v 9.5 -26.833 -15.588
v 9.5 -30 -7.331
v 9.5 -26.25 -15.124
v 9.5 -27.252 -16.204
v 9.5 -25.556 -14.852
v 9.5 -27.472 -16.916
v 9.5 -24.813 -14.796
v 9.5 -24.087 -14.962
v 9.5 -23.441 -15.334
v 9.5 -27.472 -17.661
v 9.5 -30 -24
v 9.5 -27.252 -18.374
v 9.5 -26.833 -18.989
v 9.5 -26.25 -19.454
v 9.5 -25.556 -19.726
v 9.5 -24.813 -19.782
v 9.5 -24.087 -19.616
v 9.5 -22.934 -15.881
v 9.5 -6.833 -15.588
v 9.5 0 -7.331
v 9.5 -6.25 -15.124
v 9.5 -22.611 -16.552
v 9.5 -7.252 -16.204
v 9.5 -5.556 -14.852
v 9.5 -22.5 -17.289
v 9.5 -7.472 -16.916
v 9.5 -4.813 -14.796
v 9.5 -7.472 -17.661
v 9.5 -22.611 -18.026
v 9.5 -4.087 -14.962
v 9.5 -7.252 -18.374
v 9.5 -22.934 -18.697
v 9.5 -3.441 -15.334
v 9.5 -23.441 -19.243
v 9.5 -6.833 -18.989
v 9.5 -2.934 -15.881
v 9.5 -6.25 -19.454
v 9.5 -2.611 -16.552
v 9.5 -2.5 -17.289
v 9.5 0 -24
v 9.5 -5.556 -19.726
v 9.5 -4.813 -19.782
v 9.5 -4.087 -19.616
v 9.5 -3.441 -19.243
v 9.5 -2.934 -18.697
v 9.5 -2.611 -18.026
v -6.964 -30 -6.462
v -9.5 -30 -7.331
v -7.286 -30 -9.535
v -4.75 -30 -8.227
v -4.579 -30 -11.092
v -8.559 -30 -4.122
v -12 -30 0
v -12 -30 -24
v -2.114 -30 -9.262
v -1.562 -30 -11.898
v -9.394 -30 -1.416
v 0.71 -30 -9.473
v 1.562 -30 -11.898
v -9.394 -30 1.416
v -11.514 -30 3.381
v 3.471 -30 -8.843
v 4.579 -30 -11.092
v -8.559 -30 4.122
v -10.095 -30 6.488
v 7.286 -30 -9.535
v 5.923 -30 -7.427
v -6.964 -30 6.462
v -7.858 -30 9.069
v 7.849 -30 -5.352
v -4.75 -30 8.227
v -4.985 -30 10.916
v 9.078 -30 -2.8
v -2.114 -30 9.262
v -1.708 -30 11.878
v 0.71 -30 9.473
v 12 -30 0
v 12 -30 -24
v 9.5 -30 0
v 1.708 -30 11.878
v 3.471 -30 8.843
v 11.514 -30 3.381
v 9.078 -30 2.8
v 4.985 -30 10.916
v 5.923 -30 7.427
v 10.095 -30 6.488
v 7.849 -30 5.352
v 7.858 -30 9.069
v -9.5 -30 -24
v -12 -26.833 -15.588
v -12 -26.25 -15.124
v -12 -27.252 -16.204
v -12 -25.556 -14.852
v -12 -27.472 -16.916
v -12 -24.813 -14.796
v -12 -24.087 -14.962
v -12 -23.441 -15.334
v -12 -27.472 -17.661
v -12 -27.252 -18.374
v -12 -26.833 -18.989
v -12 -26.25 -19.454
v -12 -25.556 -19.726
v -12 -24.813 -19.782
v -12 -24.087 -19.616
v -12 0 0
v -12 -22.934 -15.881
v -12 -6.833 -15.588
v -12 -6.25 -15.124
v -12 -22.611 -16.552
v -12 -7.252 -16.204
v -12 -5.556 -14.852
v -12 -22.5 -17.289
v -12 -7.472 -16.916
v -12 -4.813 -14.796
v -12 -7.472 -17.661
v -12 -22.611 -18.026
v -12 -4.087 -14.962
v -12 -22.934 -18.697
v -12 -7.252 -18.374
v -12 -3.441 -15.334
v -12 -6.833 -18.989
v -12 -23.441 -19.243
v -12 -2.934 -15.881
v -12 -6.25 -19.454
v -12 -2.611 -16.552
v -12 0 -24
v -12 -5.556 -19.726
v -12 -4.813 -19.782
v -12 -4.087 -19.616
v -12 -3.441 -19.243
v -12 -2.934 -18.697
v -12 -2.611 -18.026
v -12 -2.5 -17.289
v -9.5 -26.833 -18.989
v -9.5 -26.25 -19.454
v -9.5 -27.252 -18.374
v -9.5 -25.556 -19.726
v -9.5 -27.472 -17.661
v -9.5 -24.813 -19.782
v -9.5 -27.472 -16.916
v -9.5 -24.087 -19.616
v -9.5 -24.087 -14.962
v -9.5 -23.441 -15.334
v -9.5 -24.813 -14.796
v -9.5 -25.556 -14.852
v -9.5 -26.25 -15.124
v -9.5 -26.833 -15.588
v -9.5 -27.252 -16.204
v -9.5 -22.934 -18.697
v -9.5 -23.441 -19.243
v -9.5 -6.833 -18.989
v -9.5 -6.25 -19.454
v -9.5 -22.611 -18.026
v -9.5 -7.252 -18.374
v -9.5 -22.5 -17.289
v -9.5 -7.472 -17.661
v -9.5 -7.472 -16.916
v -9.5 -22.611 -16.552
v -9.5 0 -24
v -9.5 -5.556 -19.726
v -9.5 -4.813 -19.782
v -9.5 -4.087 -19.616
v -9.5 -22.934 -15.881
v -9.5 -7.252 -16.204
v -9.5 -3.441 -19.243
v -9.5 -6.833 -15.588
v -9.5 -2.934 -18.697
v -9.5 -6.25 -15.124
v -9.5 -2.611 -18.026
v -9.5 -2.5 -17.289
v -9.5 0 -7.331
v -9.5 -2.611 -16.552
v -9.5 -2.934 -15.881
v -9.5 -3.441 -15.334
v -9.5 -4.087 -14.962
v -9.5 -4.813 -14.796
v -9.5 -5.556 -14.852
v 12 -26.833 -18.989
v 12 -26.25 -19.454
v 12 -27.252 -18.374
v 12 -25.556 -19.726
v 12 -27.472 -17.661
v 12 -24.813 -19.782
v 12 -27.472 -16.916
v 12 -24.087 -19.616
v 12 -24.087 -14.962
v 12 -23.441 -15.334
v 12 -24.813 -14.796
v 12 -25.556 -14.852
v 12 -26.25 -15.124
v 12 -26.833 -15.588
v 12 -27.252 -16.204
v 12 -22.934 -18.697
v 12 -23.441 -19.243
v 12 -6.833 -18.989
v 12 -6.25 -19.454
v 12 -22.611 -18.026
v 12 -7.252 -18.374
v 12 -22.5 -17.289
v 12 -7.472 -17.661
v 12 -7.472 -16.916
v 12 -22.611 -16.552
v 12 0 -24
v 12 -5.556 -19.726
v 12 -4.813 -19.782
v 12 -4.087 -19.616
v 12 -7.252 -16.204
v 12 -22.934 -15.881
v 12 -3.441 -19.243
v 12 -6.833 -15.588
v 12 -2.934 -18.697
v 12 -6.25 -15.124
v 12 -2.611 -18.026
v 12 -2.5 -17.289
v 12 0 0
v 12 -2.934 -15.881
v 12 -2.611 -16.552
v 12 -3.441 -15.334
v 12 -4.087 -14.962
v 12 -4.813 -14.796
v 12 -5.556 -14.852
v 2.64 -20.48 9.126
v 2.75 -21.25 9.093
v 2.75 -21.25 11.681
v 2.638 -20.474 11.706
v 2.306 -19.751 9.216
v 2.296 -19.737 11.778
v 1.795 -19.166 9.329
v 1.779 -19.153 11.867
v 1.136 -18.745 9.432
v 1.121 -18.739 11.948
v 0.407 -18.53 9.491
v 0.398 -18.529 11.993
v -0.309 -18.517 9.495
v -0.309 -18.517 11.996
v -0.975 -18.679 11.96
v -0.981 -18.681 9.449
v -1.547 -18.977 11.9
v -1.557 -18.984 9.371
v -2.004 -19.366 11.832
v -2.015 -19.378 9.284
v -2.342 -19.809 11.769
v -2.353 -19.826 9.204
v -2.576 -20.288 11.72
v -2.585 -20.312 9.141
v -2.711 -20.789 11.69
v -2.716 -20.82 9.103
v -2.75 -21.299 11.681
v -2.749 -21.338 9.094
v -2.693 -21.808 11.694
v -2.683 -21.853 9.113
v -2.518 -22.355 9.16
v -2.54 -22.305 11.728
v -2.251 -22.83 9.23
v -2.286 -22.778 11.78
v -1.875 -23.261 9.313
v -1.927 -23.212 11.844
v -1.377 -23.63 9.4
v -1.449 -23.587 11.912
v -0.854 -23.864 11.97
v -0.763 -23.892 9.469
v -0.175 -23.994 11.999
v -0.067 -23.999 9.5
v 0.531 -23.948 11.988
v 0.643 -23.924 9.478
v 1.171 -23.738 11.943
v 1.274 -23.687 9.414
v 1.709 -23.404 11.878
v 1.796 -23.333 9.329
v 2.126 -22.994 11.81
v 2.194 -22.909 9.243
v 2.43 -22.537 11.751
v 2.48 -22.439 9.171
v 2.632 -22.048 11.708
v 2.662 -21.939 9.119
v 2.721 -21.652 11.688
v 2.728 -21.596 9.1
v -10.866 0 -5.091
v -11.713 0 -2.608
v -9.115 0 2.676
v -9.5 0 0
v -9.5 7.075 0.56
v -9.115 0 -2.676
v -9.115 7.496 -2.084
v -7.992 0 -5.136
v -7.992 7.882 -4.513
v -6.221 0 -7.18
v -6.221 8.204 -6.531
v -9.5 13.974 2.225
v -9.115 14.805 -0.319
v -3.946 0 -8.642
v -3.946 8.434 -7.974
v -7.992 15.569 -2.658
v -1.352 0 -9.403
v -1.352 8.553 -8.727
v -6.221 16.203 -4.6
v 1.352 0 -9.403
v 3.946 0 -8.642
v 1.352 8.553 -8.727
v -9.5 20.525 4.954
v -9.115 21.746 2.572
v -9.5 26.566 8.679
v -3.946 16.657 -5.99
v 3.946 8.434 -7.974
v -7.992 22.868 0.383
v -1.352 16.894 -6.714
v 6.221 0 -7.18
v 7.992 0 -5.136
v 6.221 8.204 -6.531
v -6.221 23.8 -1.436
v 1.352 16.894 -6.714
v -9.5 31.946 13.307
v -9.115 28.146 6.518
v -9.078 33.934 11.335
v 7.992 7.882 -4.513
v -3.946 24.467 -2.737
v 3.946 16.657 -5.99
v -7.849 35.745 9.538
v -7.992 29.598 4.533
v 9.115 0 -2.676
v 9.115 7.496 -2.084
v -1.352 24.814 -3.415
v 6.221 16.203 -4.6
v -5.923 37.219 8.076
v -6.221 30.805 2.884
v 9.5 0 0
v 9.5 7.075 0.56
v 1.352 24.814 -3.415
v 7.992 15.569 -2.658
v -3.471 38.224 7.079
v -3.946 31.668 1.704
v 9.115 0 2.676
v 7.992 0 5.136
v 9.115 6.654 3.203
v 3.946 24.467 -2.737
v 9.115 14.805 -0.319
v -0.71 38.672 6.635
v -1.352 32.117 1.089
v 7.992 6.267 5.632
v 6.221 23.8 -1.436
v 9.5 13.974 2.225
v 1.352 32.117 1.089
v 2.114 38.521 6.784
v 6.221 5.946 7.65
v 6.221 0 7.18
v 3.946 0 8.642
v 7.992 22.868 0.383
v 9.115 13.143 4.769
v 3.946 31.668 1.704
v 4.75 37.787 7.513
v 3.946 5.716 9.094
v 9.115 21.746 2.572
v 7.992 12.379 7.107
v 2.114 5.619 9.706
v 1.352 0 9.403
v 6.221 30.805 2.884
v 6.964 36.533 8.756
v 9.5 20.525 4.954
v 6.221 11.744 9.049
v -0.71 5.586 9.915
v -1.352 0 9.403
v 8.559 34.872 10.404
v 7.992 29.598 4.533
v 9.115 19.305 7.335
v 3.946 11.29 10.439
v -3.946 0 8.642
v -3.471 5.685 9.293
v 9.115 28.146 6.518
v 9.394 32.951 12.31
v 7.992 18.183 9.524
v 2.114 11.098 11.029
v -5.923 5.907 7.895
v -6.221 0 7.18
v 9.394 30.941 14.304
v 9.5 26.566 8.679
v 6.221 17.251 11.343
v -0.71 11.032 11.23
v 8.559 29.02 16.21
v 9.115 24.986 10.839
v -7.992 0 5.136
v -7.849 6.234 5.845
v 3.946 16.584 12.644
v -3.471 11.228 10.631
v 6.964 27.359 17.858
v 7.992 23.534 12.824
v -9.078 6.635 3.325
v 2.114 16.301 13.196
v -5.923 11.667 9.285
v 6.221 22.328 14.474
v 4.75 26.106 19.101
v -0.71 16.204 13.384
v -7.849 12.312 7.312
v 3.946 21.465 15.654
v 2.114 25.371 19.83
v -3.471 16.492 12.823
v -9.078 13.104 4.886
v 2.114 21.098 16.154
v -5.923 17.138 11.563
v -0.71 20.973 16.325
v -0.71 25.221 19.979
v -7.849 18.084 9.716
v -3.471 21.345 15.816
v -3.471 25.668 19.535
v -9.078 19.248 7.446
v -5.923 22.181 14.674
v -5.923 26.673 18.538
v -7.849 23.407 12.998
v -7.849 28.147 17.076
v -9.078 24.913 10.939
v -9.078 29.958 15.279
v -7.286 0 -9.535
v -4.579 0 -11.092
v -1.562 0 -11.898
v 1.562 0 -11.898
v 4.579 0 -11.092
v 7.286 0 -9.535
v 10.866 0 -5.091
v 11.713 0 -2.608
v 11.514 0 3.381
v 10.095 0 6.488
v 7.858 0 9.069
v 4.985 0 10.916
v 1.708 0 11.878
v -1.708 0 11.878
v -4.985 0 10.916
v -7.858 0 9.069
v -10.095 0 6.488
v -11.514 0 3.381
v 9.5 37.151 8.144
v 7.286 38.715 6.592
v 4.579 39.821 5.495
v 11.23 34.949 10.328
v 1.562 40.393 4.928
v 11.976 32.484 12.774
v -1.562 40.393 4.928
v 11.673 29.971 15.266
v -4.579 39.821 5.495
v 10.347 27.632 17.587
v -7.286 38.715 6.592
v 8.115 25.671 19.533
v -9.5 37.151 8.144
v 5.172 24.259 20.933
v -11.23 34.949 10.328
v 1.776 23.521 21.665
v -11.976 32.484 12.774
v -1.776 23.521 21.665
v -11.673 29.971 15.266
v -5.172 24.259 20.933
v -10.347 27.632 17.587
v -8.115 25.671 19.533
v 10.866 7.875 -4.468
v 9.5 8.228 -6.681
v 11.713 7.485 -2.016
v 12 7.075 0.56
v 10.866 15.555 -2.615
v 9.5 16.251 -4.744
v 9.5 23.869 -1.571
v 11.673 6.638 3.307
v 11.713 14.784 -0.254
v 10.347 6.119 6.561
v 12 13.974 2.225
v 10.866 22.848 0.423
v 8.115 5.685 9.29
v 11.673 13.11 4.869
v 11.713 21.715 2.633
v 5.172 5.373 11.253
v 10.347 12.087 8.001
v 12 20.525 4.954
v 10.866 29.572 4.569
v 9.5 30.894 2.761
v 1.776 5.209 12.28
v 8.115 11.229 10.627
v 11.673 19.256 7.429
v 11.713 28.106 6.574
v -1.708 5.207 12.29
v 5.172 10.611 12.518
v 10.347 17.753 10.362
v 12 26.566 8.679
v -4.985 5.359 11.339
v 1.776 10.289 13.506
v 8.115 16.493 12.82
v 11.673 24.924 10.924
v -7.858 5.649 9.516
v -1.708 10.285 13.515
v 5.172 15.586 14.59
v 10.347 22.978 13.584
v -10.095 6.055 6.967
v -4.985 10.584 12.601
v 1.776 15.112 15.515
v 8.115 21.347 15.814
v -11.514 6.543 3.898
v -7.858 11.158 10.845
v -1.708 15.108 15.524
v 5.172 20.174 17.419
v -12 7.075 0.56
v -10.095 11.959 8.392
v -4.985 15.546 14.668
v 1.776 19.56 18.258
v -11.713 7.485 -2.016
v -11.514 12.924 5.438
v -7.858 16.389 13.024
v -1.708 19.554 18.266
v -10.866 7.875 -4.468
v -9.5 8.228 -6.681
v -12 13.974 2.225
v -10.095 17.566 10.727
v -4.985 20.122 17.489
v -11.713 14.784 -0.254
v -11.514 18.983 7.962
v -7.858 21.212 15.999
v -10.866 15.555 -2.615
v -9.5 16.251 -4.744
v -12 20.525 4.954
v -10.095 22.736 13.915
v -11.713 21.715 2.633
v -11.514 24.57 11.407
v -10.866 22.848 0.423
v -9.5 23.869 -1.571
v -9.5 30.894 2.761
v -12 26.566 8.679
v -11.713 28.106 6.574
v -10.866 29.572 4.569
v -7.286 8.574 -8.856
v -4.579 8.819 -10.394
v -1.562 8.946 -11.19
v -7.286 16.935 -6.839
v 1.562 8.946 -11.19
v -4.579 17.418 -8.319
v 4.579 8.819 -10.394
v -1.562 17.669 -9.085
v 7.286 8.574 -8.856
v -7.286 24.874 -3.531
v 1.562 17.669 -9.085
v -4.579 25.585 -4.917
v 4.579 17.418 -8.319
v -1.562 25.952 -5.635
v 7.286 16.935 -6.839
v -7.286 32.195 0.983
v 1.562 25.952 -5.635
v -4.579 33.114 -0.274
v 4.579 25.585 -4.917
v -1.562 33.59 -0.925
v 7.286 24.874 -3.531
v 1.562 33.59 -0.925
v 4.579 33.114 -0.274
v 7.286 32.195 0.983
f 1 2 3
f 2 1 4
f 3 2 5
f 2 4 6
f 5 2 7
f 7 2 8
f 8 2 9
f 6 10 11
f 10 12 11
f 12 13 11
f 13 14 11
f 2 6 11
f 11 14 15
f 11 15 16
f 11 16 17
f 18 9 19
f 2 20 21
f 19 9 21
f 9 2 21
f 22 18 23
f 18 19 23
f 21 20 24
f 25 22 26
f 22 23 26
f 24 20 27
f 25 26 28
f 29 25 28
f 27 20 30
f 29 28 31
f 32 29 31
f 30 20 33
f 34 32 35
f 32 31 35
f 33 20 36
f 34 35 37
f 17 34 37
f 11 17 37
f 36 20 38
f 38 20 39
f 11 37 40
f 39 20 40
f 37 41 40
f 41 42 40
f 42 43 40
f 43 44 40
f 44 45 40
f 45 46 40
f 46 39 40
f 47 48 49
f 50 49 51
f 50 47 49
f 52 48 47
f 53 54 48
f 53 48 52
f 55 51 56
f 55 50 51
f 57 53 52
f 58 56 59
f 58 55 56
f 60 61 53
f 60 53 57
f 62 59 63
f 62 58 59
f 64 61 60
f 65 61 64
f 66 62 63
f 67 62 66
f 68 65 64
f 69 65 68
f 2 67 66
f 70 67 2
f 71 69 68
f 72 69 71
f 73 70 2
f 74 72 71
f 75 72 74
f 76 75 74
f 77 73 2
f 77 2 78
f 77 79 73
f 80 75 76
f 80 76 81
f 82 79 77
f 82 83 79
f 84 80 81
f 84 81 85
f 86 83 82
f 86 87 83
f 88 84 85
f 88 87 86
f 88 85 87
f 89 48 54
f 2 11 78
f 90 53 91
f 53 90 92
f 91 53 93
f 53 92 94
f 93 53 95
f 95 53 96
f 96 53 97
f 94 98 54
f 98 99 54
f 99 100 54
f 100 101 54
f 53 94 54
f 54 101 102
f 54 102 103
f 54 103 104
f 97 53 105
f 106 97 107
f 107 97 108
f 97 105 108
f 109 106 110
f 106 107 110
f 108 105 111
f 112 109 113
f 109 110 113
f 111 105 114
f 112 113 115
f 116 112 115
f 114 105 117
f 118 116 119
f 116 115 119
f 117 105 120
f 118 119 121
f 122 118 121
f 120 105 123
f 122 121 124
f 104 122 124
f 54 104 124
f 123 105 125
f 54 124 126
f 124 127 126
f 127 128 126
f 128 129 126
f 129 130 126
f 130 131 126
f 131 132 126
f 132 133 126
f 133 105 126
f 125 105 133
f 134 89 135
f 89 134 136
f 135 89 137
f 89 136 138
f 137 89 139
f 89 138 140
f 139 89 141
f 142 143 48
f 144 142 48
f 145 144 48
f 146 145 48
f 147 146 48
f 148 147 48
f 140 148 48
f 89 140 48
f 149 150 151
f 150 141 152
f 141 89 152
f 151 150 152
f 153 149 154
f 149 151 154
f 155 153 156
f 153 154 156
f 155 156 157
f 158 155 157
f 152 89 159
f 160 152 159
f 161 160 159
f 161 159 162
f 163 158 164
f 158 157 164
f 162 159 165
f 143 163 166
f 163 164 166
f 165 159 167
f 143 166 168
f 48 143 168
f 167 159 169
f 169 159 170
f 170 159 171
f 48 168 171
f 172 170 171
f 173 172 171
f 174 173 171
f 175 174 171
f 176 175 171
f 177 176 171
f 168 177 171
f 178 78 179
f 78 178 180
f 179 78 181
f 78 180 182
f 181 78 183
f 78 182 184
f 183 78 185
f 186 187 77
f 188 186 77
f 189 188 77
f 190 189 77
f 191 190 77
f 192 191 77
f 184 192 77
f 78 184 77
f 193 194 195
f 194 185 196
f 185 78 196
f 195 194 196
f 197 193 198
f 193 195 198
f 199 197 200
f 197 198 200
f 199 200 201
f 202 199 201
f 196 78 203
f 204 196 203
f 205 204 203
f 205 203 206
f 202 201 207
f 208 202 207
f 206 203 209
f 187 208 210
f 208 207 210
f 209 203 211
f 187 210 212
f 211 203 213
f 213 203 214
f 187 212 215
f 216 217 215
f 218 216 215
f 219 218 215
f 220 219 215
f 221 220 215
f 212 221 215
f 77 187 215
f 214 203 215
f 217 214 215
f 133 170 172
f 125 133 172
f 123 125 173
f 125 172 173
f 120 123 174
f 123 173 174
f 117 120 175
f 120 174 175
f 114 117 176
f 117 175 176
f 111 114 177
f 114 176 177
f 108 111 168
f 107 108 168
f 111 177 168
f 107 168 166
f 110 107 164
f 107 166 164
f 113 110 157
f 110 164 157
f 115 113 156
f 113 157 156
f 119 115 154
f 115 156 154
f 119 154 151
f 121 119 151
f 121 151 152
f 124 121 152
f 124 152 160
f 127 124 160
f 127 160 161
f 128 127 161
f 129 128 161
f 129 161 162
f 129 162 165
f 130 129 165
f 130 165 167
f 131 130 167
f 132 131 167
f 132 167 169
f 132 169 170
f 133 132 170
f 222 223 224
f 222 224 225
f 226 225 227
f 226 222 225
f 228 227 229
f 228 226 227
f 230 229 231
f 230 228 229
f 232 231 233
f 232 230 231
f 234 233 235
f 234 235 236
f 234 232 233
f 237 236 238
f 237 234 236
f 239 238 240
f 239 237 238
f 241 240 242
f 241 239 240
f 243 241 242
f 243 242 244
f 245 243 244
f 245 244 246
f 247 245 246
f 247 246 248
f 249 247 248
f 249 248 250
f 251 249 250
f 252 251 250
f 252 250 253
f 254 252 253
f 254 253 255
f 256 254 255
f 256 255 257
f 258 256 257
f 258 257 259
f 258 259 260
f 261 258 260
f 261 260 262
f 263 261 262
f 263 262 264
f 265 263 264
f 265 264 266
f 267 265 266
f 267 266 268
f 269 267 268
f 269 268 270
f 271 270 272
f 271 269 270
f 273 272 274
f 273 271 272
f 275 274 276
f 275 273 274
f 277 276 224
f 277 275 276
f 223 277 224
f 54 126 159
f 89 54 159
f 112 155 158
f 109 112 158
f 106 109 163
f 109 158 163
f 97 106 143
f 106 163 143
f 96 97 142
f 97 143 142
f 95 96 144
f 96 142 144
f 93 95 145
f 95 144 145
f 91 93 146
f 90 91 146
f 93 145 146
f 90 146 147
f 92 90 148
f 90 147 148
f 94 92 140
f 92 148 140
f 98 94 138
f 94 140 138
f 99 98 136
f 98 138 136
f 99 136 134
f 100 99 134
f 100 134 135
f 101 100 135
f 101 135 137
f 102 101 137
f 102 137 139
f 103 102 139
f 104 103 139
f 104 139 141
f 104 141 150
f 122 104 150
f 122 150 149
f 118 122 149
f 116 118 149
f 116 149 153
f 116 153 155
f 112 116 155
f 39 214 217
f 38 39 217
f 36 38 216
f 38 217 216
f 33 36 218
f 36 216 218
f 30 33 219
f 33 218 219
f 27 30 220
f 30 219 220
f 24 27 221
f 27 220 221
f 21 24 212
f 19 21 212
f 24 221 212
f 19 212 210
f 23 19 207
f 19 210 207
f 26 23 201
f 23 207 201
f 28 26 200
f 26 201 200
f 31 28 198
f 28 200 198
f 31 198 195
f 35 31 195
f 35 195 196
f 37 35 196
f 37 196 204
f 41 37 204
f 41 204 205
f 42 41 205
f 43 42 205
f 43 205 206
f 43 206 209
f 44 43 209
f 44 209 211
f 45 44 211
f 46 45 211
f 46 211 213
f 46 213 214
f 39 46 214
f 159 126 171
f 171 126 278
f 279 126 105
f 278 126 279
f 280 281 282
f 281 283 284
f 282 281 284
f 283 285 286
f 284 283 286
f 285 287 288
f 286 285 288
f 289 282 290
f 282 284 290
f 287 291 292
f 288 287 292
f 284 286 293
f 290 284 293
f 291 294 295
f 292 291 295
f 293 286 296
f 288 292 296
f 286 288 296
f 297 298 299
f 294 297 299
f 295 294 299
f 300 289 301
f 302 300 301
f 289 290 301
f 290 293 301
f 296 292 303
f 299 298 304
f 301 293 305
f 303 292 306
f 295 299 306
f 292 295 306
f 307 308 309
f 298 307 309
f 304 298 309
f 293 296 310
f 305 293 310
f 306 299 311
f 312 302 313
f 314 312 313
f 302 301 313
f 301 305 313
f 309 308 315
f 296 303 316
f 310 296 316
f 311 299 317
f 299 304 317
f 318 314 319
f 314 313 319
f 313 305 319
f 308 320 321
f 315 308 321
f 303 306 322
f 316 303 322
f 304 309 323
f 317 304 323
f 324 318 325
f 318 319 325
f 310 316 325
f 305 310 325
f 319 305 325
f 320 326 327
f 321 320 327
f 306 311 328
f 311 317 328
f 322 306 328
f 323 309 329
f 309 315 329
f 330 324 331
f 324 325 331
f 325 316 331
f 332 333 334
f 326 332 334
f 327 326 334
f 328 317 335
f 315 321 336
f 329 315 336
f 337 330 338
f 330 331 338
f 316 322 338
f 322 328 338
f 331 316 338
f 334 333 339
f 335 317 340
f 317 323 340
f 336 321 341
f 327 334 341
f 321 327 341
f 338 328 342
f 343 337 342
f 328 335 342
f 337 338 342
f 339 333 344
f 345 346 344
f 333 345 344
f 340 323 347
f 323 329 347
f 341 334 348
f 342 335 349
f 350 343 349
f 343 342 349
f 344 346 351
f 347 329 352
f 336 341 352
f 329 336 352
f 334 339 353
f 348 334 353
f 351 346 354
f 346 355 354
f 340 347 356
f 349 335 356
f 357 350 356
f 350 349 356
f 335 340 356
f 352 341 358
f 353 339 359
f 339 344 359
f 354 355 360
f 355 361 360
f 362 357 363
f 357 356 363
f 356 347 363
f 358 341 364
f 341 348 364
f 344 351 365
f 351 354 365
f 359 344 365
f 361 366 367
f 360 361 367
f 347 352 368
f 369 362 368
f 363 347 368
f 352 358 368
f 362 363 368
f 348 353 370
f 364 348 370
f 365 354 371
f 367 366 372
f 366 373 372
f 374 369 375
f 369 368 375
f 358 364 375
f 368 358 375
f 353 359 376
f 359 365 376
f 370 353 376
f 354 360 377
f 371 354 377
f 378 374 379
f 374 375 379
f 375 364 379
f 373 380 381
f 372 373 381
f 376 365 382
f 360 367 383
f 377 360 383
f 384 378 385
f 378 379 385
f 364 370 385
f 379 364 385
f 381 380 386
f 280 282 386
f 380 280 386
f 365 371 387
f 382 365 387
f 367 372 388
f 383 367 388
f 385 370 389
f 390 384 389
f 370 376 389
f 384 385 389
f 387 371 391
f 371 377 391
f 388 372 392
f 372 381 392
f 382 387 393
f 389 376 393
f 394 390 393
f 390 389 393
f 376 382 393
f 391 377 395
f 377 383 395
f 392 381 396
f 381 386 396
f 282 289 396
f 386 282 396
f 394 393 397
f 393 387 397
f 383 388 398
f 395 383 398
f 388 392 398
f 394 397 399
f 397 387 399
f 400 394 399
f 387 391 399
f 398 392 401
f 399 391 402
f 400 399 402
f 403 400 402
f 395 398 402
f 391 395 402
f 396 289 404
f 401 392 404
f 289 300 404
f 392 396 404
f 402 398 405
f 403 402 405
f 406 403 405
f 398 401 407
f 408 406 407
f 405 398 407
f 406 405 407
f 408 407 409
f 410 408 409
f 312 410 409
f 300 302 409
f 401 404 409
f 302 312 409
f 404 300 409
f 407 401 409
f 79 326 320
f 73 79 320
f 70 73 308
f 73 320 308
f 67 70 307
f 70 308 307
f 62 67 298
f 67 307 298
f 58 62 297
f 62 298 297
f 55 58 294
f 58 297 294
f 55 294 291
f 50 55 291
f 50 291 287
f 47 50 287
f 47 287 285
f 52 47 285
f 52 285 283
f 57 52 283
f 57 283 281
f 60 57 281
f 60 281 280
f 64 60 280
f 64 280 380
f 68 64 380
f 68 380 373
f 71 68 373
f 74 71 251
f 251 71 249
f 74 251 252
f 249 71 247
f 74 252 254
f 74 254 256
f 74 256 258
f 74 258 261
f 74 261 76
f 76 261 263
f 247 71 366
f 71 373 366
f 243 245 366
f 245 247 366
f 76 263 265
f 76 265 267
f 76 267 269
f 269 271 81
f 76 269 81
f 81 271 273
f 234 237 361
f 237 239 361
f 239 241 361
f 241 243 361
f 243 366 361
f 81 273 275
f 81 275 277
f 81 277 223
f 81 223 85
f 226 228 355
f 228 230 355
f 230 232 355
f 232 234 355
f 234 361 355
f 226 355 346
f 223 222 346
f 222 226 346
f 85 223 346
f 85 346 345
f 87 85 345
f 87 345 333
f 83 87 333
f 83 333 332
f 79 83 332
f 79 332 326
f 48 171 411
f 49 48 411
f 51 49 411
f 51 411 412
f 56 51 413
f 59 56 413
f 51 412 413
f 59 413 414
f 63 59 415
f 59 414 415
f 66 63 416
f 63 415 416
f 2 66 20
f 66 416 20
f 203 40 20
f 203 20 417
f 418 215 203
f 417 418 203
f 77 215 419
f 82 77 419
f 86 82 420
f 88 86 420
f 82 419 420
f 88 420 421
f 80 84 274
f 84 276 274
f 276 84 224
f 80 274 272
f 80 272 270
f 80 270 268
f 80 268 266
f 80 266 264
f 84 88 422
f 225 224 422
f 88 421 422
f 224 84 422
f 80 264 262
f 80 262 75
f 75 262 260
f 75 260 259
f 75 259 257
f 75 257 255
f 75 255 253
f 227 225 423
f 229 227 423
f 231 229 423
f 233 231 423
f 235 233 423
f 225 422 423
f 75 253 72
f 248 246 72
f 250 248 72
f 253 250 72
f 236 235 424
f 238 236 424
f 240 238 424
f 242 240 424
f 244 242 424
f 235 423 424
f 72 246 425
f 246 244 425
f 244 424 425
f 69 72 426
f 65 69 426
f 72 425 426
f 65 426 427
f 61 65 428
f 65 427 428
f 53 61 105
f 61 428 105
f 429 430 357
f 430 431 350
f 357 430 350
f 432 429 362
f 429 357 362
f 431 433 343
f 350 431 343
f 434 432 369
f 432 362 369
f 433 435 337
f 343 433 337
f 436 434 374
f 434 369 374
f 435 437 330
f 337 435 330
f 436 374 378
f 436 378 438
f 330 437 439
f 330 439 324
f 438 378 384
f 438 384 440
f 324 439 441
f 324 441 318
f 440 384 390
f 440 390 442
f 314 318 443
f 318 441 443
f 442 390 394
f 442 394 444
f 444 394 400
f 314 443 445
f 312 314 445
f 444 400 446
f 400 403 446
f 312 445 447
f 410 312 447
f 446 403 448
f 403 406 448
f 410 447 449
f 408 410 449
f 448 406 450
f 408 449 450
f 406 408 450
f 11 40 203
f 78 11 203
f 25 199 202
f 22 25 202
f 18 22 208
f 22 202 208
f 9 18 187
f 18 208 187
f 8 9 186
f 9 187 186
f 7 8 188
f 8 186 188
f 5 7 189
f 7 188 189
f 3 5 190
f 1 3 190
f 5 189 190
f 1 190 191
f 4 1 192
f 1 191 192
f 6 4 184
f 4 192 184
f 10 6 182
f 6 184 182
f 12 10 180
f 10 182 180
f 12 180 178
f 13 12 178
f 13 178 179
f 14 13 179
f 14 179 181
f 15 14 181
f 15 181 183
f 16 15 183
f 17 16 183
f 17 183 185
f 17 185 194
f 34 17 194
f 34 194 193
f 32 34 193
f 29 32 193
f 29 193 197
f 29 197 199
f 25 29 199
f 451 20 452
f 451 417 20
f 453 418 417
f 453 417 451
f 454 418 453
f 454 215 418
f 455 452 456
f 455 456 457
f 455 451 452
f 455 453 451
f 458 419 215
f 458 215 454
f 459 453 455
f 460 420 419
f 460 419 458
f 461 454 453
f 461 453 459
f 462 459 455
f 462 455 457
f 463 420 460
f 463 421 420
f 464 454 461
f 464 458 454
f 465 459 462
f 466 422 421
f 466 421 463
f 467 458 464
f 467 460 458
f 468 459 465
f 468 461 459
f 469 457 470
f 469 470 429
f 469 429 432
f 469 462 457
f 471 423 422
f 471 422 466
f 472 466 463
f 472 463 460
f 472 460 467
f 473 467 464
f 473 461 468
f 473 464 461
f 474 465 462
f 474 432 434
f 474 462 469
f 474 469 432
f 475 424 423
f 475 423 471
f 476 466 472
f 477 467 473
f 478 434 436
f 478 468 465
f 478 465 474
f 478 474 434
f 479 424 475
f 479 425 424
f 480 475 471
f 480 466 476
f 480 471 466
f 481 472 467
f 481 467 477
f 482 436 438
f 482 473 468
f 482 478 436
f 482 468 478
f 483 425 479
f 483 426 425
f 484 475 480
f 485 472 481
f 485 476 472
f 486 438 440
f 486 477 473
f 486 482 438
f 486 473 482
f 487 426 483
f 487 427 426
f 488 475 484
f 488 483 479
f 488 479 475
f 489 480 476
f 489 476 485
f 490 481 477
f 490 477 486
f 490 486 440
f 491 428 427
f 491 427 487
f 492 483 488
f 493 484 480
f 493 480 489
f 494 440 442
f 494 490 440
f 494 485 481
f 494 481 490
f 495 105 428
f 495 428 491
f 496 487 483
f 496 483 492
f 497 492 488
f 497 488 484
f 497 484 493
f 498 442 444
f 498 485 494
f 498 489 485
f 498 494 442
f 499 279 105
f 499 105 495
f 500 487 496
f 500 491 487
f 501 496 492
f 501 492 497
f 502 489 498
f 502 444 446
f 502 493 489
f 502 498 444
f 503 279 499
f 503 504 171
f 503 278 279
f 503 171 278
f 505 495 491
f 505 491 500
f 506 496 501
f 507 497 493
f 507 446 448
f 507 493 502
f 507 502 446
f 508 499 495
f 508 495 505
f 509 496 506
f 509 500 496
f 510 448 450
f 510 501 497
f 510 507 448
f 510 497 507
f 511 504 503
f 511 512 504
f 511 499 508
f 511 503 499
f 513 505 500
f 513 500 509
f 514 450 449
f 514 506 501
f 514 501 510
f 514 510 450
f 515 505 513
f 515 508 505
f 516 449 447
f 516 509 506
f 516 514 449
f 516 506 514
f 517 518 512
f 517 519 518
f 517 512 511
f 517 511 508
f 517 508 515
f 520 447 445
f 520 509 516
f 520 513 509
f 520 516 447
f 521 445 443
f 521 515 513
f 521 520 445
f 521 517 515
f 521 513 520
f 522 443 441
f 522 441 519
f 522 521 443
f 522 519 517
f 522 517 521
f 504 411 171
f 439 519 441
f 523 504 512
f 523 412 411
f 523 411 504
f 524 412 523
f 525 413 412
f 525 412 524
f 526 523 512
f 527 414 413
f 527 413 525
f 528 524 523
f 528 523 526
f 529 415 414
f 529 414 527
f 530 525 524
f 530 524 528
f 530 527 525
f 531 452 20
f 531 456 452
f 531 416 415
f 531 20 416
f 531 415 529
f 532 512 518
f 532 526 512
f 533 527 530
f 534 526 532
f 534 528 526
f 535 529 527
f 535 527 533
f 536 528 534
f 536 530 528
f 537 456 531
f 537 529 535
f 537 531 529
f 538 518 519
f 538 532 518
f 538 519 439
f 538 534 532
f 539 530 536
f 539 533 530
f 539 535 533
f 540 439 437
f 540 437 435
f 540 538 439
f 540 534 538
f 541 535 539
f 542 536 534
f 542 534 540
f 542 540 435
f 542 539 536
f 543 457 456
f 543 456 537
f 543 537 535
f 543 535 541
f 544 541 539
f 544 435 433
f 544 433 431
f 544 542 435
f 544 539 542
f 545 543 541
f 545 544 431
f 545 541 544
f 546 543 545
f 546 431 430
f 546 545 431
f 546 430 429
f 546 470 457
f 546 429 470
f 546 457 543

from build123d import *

# Parameters (mm, degrees)
F1_DEPTH = 30
F4_R     = 2.5
F5_DEPTH = 50
F6_R     = 2.75
F7_DEPTH = 25


with BuildPart() as f1:
    # F0 (on Front) → F1 (new body)
    with BuildSketch(Plane.XZ):
        with BuildLine():
            Line((9.5, 0), (12, 0))
            ThreePointArc((12, 0), (0, 12), (-12, 0))
            Line((-12, 0), (-9.5, 0))
            ThreePointArc((-9.5, 0), (0, 9.5), (9.5, 0))
        make_face()
        with BuildLine():
            Line((12, -24), (12, 0))
            ThreePointArc((12, 0), (11.3578166916, -3.8729833462), (9.5, -7.3314391493))
            Line((9.5, -7.3314391493), (9.5, -24))
            Line((9.5, -24), (12, -24))
        make_face()
        with BuildLine():
            ThreePointArc((9.5, -7.3314391493), (11.3578166916, -3.8729833462), (12, 0))
            Line((12, 0), (9.5, 0))
            Line((9.5, 0), (9.5, -7.3314391493))
        make_face()
        with BuildLine():
            Line((-9.5, 0), (-12, 0))
            ThreePointArc((-12, 0), (-11.3578166916, -3.8729833462), (-9.5, -7.3314391493))
            Line((-9.5, -7.3314391493), (-9.5, 0))
        make_face()
        with BuildLine():
            ThreePointArc((-9.5, -7.3314391493), (-11.3578166916, -3.8729833462), (-12, 0))
            Line((-12, 0), (-12, -24))
            Line((-12, -24), (-9.5, -24))
            Line((-9.5, -24), (-9.5, -7.3314391493))
        make_face()
        with BuildLine():
            ThreePointArc((-9.5, -7.3314391493), (0, -12), (9.5, -7.3314391493))
            Line((9.5, -7.3314391493), (9.5, 0))
            ThreePointArc((9.5, 0), (0, -9.5), (-9.5, 0))
            Line((-9.5, 0), (-9.5, -7.3314391493))
        make_face()
    extrude(amount=F1_DEPTH)

    # F3: sweep along a path in F2
    with BuildLine(Plane.YZ) as f3_path:
        ThreePointArc((0, 0), (17.3034739964, 3.4597810832), (31.9462265702, 13.3071205486))
    # F0 (on Front) → F3 (sweep)
    with BuildSketch(Plane.XZ):
        with BuildLine():
            Line((9.5, 0), (12, 0))
            ThreePointArc((12, 0), (0, 12), (-12, 0))
            Line((-12, 0), (-9.5, 0))
            ThreePointArc((-9.5, 0), (0, 9.5), (9.5, 0))
        make_face()
        with BuildLine():
            ThreePointArc((9.5, -7.3314391493), (11.3578166916, -3.8729833462), (12, 0))
            Line((12, 0), (9.5, 0))
            Line((9.5, 0), (9.5, -7.3314391493))
        make_face()
        with BuildLine():
            ThreePointArc((-9.5, -7.3314391493), (0, -12), (9.5, -7.3314391493))
            Line((9.5, -7.3314391493), (9.5, 0))
            ThreePointArc((9.5, 0), (0, -9.5), (-9.5, 0))
            Line((-9.5, 0), (-9.5, -7.3314391493))
        make_face()
        with BuildLine():
            Line((-9.5, 0), (-12, 0))
            ThreePointArc((-12, 0), (-11.3578166916, -3.8729833462), (-9.5, -7.3314391493))
            Line((-9.5, -7.3314391493), (-9.5, 0))
        make_face()
    sweep(path=f3_path.line)

    # F4 (on face) → F5 (cut)
    with BuildSketch(Plane.YZ.offset(12)):
        with Locations((-25, -17.2888711095)):
            Circle(F4_R)
        with Locations((-5, -17.2888711095)):
            Circle(F4_R)
    extrude(amount=-F5_DEPTH, mode=Mode.SUBTRACT)

    # F6 (on Top) → F7 (cut)
    with BuildSketch(Plane.XY):
        with Locations((0, -21.25)):
            Circle(F6_R)
    extrude(amount=F7_DEPTH, mode=Mode.SUBTRACT)


solid = f1.part
